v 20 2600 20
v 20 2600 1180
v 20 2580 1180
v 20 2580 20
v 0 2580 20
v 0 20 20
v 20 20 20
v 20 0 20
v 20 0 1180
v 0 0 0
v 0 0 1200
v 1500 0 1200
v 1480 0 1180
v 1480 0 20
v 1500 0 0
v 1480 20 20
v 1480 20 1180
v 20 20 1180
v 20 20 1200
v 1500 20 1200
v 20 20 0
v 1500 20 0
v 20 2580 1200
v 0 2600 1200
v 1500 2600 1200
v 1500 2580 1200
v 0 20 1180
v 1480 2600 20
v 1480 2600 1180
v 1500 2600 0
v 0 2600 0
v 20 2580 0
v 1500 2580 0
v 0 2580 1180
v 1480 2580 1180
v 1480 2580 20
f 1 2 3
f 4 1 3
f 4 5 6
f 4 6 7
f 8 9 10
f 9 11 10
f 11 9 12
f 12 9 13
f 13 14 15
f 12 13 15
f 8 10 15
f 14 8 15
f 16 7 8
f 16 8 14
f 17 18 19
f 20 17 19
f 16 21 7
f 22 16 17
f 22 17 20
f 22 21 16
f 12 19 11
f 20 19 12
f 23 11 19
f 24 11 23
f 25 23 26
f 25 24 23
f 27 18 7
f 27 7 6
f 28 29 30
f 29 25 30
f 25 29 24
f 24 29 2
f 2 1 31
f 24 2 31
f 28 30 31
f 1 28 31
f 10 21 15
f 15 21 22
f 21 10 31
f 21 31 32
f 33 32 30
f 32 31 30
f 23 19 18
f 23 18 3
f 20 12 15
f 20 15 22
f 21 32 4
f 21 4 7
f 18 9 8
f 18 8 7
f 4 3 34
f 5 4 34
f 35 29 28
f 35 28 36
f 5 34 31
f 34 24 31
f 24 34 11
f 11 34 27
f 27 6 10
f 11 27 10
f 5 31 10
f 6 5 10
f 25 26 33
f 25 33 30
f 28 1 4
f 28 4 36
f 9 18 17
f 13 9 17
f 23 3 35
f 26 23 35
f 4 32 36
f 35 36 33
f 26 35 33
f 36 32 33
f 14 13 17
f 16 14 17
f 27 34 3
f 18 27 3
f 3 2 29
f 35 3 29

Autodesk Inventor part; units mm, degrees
ref_plane "YZ Plane" through (0, 0, 0) normal (1, 0, 0) x (0, 1, 0)
ref_plane "XZ Plane" through (0, 0, 0) normal (0, 1, 0) x (-1, 0, 0)
ref_plane "XY Plane" through (0, 0, 0) normal (0, 0, 1) x (1, 0, 0)
sketch "Sketch1" plane through (0, 0, 0) normal (0, 0, 1) x (1, 0, 0)
  line L0 (0, 0) -> (1500, 0)
  line L1 (1500, 0) -> (1500, 2600)
  line L2 (1500, 2600) -> (0, 2600)
  line L3 (0, 2600) -> (0, 0)
  line L4 (0, 2600) -> (20, 2600)
  line L5 (20, 2600) -> (20, 2580)
  line L6 (20, 2580) -> (0, 2580)
  line L7 (0, 2580) -> (0, 2600)
  line L8 (1500, 2600) -> (1480, 2600)
  line L9 (1480, 2600) -> (1480, 2580)
  line L10 (1480, 2580) -> (1500, 2580)
  line L11 (1500, 2580) -> (1500, 2600)
  line L12 (1500, 0) -> (1480, 0)
  line L13 (1480, 0) -> (1480, 20)
  line L14 (1480, 20) -> (1500, 20)
  line L15 (1500, 20) -> (1500, 0)
  line L16 (0, 0) -> (20, 0)
  line L17 (20, 0) -> (20, 20)
  line L18 (20, 20) -> (0, 20)
  line L19 (0, 20) -> (0, 0)
  line L20 (20, 2580) -> (1480, 2580)
  line L21 (20, 2580) -> (20, 20)
  line L22 (20, 20) -> (1480, 20)
  line L23 (1480, 20) -> (1480, 2580)
  point P0 (1500, 2580)
  point P1 (1480, 2600)
  point P2 (1500, 20)
  point P3 (1480, 0)
  point P4 (0, 2580)
  point P5 (20, 2600)
  dimension "d0" = 1500
  dimension "d1" = 2600
  dimension "d2" = 20
  dimension "d3" = 20
  dimension "d4" = 20
  dimension "d5" = 20
  dimension "d6" = 20
  dimension "d7" = 20
  dimension "d8" = 20
  dimension "d9" = 20
extrude "Extrusion1" add sketch "Sketch1" along normal blind 1200 contours L3 L18 L17 L0 | L13 L14 L1 L0 | L3 L2 L5 L6 | L9 L2 L1 L10
extrude "Extrusion2" add sketch "Sketch1" along normal blind 20 contours L17 L22 L13 L0 | L3 L6 L21 L18 | L5 L2 L9 L20
sketch "Sketch2" plane through (0, 0, 1200) normal (0, 0, 1) x (1, 0, 0)
  line L0 (0, 20) -> (0, 0) projected
  line L1 (0, 0) -> (20, 0) projected
  line L2 (20, 0) -> (20, 20) projected
  line L3 (20, 20) -> (0, 20) projected
  line L4 (20, 2580) -> (20, 2600) projected
  line L5 (20, 2600) -> (0, 2600) projected
  line L6 (0, 2600) -> (0, 2580) projected
  line L7 (0, 2580) -> (20, 2580) projected
  line L8 (1480, 20) -> (1480, 0) projected
  line L9 (1480, 0) -> (1500, 0) projected
  line L10 (1500, 0) -> (1500, 20) projected
  line L11 (1500, 20) -> (1480, 20) projected
  line L12 (1500, 2580) -> (1500, 2600) projected
  line L13 (1500, 2600) -> (1480, 2600) projected
  line L14 (1480, 2600) -> (1480, 2580) projected
  line L15 (1480, 2580) -> (1500, 2580) projected
  line L16 (20, 0) -> (20, 20) projected
  line L17 (1480, 20) -> (1480, 0) projected
  line L18 (1480, 20) -> (20, 20)
  line L19 (1480, 2600) -> (1480, 2580) projected
  line L20 (1480, 2600) -> (20, 2600) projected
  line L21 (20, 2580) -> (20, 2600) projected
  line L22 (20, 2580) -> (1480, 2580) projected
  line L23 (1480, 20) -> (20, 20) projected
  line L24 (20, 2580) -> (1480, 2580) projected
  line L25 (0, 2580) -> (20, 2580) projected
  line L26 (0, 2580) -> (0, 20) projected
  line L27 (20, 20) -> (0, 20) projected
  line L28 (20, 20) -> (20, 2580) projected
  line L29 (20, 0) -> (20, 20) projected
  line L30 (1480, 20) -> (1480, 0) projected
  line L31 (1480, 2600) -> (1480, 2580) projected
  line L32 (1480, 2600) -> (20, 2600) projected
  line L33 (20, 2580) -> (20, 2600) projected
  line L34 (20, 0) -> (1480, 0)
  line L35 (0, 0) -> (1500, 0) projected
extrude "Extrusion3" add sketch "Sketch2" against normal blind 20 contours L26 L7 L28 L3 | L18 L8 L34 L2 | L4 L20 L14 L22
equation "\"d0\" = comprimento"
equation "\"d1\" = largura"
equation "\"comprimento\" = 1500"
equation "\"largura\" = 2600"
properties part number "estrutura"
